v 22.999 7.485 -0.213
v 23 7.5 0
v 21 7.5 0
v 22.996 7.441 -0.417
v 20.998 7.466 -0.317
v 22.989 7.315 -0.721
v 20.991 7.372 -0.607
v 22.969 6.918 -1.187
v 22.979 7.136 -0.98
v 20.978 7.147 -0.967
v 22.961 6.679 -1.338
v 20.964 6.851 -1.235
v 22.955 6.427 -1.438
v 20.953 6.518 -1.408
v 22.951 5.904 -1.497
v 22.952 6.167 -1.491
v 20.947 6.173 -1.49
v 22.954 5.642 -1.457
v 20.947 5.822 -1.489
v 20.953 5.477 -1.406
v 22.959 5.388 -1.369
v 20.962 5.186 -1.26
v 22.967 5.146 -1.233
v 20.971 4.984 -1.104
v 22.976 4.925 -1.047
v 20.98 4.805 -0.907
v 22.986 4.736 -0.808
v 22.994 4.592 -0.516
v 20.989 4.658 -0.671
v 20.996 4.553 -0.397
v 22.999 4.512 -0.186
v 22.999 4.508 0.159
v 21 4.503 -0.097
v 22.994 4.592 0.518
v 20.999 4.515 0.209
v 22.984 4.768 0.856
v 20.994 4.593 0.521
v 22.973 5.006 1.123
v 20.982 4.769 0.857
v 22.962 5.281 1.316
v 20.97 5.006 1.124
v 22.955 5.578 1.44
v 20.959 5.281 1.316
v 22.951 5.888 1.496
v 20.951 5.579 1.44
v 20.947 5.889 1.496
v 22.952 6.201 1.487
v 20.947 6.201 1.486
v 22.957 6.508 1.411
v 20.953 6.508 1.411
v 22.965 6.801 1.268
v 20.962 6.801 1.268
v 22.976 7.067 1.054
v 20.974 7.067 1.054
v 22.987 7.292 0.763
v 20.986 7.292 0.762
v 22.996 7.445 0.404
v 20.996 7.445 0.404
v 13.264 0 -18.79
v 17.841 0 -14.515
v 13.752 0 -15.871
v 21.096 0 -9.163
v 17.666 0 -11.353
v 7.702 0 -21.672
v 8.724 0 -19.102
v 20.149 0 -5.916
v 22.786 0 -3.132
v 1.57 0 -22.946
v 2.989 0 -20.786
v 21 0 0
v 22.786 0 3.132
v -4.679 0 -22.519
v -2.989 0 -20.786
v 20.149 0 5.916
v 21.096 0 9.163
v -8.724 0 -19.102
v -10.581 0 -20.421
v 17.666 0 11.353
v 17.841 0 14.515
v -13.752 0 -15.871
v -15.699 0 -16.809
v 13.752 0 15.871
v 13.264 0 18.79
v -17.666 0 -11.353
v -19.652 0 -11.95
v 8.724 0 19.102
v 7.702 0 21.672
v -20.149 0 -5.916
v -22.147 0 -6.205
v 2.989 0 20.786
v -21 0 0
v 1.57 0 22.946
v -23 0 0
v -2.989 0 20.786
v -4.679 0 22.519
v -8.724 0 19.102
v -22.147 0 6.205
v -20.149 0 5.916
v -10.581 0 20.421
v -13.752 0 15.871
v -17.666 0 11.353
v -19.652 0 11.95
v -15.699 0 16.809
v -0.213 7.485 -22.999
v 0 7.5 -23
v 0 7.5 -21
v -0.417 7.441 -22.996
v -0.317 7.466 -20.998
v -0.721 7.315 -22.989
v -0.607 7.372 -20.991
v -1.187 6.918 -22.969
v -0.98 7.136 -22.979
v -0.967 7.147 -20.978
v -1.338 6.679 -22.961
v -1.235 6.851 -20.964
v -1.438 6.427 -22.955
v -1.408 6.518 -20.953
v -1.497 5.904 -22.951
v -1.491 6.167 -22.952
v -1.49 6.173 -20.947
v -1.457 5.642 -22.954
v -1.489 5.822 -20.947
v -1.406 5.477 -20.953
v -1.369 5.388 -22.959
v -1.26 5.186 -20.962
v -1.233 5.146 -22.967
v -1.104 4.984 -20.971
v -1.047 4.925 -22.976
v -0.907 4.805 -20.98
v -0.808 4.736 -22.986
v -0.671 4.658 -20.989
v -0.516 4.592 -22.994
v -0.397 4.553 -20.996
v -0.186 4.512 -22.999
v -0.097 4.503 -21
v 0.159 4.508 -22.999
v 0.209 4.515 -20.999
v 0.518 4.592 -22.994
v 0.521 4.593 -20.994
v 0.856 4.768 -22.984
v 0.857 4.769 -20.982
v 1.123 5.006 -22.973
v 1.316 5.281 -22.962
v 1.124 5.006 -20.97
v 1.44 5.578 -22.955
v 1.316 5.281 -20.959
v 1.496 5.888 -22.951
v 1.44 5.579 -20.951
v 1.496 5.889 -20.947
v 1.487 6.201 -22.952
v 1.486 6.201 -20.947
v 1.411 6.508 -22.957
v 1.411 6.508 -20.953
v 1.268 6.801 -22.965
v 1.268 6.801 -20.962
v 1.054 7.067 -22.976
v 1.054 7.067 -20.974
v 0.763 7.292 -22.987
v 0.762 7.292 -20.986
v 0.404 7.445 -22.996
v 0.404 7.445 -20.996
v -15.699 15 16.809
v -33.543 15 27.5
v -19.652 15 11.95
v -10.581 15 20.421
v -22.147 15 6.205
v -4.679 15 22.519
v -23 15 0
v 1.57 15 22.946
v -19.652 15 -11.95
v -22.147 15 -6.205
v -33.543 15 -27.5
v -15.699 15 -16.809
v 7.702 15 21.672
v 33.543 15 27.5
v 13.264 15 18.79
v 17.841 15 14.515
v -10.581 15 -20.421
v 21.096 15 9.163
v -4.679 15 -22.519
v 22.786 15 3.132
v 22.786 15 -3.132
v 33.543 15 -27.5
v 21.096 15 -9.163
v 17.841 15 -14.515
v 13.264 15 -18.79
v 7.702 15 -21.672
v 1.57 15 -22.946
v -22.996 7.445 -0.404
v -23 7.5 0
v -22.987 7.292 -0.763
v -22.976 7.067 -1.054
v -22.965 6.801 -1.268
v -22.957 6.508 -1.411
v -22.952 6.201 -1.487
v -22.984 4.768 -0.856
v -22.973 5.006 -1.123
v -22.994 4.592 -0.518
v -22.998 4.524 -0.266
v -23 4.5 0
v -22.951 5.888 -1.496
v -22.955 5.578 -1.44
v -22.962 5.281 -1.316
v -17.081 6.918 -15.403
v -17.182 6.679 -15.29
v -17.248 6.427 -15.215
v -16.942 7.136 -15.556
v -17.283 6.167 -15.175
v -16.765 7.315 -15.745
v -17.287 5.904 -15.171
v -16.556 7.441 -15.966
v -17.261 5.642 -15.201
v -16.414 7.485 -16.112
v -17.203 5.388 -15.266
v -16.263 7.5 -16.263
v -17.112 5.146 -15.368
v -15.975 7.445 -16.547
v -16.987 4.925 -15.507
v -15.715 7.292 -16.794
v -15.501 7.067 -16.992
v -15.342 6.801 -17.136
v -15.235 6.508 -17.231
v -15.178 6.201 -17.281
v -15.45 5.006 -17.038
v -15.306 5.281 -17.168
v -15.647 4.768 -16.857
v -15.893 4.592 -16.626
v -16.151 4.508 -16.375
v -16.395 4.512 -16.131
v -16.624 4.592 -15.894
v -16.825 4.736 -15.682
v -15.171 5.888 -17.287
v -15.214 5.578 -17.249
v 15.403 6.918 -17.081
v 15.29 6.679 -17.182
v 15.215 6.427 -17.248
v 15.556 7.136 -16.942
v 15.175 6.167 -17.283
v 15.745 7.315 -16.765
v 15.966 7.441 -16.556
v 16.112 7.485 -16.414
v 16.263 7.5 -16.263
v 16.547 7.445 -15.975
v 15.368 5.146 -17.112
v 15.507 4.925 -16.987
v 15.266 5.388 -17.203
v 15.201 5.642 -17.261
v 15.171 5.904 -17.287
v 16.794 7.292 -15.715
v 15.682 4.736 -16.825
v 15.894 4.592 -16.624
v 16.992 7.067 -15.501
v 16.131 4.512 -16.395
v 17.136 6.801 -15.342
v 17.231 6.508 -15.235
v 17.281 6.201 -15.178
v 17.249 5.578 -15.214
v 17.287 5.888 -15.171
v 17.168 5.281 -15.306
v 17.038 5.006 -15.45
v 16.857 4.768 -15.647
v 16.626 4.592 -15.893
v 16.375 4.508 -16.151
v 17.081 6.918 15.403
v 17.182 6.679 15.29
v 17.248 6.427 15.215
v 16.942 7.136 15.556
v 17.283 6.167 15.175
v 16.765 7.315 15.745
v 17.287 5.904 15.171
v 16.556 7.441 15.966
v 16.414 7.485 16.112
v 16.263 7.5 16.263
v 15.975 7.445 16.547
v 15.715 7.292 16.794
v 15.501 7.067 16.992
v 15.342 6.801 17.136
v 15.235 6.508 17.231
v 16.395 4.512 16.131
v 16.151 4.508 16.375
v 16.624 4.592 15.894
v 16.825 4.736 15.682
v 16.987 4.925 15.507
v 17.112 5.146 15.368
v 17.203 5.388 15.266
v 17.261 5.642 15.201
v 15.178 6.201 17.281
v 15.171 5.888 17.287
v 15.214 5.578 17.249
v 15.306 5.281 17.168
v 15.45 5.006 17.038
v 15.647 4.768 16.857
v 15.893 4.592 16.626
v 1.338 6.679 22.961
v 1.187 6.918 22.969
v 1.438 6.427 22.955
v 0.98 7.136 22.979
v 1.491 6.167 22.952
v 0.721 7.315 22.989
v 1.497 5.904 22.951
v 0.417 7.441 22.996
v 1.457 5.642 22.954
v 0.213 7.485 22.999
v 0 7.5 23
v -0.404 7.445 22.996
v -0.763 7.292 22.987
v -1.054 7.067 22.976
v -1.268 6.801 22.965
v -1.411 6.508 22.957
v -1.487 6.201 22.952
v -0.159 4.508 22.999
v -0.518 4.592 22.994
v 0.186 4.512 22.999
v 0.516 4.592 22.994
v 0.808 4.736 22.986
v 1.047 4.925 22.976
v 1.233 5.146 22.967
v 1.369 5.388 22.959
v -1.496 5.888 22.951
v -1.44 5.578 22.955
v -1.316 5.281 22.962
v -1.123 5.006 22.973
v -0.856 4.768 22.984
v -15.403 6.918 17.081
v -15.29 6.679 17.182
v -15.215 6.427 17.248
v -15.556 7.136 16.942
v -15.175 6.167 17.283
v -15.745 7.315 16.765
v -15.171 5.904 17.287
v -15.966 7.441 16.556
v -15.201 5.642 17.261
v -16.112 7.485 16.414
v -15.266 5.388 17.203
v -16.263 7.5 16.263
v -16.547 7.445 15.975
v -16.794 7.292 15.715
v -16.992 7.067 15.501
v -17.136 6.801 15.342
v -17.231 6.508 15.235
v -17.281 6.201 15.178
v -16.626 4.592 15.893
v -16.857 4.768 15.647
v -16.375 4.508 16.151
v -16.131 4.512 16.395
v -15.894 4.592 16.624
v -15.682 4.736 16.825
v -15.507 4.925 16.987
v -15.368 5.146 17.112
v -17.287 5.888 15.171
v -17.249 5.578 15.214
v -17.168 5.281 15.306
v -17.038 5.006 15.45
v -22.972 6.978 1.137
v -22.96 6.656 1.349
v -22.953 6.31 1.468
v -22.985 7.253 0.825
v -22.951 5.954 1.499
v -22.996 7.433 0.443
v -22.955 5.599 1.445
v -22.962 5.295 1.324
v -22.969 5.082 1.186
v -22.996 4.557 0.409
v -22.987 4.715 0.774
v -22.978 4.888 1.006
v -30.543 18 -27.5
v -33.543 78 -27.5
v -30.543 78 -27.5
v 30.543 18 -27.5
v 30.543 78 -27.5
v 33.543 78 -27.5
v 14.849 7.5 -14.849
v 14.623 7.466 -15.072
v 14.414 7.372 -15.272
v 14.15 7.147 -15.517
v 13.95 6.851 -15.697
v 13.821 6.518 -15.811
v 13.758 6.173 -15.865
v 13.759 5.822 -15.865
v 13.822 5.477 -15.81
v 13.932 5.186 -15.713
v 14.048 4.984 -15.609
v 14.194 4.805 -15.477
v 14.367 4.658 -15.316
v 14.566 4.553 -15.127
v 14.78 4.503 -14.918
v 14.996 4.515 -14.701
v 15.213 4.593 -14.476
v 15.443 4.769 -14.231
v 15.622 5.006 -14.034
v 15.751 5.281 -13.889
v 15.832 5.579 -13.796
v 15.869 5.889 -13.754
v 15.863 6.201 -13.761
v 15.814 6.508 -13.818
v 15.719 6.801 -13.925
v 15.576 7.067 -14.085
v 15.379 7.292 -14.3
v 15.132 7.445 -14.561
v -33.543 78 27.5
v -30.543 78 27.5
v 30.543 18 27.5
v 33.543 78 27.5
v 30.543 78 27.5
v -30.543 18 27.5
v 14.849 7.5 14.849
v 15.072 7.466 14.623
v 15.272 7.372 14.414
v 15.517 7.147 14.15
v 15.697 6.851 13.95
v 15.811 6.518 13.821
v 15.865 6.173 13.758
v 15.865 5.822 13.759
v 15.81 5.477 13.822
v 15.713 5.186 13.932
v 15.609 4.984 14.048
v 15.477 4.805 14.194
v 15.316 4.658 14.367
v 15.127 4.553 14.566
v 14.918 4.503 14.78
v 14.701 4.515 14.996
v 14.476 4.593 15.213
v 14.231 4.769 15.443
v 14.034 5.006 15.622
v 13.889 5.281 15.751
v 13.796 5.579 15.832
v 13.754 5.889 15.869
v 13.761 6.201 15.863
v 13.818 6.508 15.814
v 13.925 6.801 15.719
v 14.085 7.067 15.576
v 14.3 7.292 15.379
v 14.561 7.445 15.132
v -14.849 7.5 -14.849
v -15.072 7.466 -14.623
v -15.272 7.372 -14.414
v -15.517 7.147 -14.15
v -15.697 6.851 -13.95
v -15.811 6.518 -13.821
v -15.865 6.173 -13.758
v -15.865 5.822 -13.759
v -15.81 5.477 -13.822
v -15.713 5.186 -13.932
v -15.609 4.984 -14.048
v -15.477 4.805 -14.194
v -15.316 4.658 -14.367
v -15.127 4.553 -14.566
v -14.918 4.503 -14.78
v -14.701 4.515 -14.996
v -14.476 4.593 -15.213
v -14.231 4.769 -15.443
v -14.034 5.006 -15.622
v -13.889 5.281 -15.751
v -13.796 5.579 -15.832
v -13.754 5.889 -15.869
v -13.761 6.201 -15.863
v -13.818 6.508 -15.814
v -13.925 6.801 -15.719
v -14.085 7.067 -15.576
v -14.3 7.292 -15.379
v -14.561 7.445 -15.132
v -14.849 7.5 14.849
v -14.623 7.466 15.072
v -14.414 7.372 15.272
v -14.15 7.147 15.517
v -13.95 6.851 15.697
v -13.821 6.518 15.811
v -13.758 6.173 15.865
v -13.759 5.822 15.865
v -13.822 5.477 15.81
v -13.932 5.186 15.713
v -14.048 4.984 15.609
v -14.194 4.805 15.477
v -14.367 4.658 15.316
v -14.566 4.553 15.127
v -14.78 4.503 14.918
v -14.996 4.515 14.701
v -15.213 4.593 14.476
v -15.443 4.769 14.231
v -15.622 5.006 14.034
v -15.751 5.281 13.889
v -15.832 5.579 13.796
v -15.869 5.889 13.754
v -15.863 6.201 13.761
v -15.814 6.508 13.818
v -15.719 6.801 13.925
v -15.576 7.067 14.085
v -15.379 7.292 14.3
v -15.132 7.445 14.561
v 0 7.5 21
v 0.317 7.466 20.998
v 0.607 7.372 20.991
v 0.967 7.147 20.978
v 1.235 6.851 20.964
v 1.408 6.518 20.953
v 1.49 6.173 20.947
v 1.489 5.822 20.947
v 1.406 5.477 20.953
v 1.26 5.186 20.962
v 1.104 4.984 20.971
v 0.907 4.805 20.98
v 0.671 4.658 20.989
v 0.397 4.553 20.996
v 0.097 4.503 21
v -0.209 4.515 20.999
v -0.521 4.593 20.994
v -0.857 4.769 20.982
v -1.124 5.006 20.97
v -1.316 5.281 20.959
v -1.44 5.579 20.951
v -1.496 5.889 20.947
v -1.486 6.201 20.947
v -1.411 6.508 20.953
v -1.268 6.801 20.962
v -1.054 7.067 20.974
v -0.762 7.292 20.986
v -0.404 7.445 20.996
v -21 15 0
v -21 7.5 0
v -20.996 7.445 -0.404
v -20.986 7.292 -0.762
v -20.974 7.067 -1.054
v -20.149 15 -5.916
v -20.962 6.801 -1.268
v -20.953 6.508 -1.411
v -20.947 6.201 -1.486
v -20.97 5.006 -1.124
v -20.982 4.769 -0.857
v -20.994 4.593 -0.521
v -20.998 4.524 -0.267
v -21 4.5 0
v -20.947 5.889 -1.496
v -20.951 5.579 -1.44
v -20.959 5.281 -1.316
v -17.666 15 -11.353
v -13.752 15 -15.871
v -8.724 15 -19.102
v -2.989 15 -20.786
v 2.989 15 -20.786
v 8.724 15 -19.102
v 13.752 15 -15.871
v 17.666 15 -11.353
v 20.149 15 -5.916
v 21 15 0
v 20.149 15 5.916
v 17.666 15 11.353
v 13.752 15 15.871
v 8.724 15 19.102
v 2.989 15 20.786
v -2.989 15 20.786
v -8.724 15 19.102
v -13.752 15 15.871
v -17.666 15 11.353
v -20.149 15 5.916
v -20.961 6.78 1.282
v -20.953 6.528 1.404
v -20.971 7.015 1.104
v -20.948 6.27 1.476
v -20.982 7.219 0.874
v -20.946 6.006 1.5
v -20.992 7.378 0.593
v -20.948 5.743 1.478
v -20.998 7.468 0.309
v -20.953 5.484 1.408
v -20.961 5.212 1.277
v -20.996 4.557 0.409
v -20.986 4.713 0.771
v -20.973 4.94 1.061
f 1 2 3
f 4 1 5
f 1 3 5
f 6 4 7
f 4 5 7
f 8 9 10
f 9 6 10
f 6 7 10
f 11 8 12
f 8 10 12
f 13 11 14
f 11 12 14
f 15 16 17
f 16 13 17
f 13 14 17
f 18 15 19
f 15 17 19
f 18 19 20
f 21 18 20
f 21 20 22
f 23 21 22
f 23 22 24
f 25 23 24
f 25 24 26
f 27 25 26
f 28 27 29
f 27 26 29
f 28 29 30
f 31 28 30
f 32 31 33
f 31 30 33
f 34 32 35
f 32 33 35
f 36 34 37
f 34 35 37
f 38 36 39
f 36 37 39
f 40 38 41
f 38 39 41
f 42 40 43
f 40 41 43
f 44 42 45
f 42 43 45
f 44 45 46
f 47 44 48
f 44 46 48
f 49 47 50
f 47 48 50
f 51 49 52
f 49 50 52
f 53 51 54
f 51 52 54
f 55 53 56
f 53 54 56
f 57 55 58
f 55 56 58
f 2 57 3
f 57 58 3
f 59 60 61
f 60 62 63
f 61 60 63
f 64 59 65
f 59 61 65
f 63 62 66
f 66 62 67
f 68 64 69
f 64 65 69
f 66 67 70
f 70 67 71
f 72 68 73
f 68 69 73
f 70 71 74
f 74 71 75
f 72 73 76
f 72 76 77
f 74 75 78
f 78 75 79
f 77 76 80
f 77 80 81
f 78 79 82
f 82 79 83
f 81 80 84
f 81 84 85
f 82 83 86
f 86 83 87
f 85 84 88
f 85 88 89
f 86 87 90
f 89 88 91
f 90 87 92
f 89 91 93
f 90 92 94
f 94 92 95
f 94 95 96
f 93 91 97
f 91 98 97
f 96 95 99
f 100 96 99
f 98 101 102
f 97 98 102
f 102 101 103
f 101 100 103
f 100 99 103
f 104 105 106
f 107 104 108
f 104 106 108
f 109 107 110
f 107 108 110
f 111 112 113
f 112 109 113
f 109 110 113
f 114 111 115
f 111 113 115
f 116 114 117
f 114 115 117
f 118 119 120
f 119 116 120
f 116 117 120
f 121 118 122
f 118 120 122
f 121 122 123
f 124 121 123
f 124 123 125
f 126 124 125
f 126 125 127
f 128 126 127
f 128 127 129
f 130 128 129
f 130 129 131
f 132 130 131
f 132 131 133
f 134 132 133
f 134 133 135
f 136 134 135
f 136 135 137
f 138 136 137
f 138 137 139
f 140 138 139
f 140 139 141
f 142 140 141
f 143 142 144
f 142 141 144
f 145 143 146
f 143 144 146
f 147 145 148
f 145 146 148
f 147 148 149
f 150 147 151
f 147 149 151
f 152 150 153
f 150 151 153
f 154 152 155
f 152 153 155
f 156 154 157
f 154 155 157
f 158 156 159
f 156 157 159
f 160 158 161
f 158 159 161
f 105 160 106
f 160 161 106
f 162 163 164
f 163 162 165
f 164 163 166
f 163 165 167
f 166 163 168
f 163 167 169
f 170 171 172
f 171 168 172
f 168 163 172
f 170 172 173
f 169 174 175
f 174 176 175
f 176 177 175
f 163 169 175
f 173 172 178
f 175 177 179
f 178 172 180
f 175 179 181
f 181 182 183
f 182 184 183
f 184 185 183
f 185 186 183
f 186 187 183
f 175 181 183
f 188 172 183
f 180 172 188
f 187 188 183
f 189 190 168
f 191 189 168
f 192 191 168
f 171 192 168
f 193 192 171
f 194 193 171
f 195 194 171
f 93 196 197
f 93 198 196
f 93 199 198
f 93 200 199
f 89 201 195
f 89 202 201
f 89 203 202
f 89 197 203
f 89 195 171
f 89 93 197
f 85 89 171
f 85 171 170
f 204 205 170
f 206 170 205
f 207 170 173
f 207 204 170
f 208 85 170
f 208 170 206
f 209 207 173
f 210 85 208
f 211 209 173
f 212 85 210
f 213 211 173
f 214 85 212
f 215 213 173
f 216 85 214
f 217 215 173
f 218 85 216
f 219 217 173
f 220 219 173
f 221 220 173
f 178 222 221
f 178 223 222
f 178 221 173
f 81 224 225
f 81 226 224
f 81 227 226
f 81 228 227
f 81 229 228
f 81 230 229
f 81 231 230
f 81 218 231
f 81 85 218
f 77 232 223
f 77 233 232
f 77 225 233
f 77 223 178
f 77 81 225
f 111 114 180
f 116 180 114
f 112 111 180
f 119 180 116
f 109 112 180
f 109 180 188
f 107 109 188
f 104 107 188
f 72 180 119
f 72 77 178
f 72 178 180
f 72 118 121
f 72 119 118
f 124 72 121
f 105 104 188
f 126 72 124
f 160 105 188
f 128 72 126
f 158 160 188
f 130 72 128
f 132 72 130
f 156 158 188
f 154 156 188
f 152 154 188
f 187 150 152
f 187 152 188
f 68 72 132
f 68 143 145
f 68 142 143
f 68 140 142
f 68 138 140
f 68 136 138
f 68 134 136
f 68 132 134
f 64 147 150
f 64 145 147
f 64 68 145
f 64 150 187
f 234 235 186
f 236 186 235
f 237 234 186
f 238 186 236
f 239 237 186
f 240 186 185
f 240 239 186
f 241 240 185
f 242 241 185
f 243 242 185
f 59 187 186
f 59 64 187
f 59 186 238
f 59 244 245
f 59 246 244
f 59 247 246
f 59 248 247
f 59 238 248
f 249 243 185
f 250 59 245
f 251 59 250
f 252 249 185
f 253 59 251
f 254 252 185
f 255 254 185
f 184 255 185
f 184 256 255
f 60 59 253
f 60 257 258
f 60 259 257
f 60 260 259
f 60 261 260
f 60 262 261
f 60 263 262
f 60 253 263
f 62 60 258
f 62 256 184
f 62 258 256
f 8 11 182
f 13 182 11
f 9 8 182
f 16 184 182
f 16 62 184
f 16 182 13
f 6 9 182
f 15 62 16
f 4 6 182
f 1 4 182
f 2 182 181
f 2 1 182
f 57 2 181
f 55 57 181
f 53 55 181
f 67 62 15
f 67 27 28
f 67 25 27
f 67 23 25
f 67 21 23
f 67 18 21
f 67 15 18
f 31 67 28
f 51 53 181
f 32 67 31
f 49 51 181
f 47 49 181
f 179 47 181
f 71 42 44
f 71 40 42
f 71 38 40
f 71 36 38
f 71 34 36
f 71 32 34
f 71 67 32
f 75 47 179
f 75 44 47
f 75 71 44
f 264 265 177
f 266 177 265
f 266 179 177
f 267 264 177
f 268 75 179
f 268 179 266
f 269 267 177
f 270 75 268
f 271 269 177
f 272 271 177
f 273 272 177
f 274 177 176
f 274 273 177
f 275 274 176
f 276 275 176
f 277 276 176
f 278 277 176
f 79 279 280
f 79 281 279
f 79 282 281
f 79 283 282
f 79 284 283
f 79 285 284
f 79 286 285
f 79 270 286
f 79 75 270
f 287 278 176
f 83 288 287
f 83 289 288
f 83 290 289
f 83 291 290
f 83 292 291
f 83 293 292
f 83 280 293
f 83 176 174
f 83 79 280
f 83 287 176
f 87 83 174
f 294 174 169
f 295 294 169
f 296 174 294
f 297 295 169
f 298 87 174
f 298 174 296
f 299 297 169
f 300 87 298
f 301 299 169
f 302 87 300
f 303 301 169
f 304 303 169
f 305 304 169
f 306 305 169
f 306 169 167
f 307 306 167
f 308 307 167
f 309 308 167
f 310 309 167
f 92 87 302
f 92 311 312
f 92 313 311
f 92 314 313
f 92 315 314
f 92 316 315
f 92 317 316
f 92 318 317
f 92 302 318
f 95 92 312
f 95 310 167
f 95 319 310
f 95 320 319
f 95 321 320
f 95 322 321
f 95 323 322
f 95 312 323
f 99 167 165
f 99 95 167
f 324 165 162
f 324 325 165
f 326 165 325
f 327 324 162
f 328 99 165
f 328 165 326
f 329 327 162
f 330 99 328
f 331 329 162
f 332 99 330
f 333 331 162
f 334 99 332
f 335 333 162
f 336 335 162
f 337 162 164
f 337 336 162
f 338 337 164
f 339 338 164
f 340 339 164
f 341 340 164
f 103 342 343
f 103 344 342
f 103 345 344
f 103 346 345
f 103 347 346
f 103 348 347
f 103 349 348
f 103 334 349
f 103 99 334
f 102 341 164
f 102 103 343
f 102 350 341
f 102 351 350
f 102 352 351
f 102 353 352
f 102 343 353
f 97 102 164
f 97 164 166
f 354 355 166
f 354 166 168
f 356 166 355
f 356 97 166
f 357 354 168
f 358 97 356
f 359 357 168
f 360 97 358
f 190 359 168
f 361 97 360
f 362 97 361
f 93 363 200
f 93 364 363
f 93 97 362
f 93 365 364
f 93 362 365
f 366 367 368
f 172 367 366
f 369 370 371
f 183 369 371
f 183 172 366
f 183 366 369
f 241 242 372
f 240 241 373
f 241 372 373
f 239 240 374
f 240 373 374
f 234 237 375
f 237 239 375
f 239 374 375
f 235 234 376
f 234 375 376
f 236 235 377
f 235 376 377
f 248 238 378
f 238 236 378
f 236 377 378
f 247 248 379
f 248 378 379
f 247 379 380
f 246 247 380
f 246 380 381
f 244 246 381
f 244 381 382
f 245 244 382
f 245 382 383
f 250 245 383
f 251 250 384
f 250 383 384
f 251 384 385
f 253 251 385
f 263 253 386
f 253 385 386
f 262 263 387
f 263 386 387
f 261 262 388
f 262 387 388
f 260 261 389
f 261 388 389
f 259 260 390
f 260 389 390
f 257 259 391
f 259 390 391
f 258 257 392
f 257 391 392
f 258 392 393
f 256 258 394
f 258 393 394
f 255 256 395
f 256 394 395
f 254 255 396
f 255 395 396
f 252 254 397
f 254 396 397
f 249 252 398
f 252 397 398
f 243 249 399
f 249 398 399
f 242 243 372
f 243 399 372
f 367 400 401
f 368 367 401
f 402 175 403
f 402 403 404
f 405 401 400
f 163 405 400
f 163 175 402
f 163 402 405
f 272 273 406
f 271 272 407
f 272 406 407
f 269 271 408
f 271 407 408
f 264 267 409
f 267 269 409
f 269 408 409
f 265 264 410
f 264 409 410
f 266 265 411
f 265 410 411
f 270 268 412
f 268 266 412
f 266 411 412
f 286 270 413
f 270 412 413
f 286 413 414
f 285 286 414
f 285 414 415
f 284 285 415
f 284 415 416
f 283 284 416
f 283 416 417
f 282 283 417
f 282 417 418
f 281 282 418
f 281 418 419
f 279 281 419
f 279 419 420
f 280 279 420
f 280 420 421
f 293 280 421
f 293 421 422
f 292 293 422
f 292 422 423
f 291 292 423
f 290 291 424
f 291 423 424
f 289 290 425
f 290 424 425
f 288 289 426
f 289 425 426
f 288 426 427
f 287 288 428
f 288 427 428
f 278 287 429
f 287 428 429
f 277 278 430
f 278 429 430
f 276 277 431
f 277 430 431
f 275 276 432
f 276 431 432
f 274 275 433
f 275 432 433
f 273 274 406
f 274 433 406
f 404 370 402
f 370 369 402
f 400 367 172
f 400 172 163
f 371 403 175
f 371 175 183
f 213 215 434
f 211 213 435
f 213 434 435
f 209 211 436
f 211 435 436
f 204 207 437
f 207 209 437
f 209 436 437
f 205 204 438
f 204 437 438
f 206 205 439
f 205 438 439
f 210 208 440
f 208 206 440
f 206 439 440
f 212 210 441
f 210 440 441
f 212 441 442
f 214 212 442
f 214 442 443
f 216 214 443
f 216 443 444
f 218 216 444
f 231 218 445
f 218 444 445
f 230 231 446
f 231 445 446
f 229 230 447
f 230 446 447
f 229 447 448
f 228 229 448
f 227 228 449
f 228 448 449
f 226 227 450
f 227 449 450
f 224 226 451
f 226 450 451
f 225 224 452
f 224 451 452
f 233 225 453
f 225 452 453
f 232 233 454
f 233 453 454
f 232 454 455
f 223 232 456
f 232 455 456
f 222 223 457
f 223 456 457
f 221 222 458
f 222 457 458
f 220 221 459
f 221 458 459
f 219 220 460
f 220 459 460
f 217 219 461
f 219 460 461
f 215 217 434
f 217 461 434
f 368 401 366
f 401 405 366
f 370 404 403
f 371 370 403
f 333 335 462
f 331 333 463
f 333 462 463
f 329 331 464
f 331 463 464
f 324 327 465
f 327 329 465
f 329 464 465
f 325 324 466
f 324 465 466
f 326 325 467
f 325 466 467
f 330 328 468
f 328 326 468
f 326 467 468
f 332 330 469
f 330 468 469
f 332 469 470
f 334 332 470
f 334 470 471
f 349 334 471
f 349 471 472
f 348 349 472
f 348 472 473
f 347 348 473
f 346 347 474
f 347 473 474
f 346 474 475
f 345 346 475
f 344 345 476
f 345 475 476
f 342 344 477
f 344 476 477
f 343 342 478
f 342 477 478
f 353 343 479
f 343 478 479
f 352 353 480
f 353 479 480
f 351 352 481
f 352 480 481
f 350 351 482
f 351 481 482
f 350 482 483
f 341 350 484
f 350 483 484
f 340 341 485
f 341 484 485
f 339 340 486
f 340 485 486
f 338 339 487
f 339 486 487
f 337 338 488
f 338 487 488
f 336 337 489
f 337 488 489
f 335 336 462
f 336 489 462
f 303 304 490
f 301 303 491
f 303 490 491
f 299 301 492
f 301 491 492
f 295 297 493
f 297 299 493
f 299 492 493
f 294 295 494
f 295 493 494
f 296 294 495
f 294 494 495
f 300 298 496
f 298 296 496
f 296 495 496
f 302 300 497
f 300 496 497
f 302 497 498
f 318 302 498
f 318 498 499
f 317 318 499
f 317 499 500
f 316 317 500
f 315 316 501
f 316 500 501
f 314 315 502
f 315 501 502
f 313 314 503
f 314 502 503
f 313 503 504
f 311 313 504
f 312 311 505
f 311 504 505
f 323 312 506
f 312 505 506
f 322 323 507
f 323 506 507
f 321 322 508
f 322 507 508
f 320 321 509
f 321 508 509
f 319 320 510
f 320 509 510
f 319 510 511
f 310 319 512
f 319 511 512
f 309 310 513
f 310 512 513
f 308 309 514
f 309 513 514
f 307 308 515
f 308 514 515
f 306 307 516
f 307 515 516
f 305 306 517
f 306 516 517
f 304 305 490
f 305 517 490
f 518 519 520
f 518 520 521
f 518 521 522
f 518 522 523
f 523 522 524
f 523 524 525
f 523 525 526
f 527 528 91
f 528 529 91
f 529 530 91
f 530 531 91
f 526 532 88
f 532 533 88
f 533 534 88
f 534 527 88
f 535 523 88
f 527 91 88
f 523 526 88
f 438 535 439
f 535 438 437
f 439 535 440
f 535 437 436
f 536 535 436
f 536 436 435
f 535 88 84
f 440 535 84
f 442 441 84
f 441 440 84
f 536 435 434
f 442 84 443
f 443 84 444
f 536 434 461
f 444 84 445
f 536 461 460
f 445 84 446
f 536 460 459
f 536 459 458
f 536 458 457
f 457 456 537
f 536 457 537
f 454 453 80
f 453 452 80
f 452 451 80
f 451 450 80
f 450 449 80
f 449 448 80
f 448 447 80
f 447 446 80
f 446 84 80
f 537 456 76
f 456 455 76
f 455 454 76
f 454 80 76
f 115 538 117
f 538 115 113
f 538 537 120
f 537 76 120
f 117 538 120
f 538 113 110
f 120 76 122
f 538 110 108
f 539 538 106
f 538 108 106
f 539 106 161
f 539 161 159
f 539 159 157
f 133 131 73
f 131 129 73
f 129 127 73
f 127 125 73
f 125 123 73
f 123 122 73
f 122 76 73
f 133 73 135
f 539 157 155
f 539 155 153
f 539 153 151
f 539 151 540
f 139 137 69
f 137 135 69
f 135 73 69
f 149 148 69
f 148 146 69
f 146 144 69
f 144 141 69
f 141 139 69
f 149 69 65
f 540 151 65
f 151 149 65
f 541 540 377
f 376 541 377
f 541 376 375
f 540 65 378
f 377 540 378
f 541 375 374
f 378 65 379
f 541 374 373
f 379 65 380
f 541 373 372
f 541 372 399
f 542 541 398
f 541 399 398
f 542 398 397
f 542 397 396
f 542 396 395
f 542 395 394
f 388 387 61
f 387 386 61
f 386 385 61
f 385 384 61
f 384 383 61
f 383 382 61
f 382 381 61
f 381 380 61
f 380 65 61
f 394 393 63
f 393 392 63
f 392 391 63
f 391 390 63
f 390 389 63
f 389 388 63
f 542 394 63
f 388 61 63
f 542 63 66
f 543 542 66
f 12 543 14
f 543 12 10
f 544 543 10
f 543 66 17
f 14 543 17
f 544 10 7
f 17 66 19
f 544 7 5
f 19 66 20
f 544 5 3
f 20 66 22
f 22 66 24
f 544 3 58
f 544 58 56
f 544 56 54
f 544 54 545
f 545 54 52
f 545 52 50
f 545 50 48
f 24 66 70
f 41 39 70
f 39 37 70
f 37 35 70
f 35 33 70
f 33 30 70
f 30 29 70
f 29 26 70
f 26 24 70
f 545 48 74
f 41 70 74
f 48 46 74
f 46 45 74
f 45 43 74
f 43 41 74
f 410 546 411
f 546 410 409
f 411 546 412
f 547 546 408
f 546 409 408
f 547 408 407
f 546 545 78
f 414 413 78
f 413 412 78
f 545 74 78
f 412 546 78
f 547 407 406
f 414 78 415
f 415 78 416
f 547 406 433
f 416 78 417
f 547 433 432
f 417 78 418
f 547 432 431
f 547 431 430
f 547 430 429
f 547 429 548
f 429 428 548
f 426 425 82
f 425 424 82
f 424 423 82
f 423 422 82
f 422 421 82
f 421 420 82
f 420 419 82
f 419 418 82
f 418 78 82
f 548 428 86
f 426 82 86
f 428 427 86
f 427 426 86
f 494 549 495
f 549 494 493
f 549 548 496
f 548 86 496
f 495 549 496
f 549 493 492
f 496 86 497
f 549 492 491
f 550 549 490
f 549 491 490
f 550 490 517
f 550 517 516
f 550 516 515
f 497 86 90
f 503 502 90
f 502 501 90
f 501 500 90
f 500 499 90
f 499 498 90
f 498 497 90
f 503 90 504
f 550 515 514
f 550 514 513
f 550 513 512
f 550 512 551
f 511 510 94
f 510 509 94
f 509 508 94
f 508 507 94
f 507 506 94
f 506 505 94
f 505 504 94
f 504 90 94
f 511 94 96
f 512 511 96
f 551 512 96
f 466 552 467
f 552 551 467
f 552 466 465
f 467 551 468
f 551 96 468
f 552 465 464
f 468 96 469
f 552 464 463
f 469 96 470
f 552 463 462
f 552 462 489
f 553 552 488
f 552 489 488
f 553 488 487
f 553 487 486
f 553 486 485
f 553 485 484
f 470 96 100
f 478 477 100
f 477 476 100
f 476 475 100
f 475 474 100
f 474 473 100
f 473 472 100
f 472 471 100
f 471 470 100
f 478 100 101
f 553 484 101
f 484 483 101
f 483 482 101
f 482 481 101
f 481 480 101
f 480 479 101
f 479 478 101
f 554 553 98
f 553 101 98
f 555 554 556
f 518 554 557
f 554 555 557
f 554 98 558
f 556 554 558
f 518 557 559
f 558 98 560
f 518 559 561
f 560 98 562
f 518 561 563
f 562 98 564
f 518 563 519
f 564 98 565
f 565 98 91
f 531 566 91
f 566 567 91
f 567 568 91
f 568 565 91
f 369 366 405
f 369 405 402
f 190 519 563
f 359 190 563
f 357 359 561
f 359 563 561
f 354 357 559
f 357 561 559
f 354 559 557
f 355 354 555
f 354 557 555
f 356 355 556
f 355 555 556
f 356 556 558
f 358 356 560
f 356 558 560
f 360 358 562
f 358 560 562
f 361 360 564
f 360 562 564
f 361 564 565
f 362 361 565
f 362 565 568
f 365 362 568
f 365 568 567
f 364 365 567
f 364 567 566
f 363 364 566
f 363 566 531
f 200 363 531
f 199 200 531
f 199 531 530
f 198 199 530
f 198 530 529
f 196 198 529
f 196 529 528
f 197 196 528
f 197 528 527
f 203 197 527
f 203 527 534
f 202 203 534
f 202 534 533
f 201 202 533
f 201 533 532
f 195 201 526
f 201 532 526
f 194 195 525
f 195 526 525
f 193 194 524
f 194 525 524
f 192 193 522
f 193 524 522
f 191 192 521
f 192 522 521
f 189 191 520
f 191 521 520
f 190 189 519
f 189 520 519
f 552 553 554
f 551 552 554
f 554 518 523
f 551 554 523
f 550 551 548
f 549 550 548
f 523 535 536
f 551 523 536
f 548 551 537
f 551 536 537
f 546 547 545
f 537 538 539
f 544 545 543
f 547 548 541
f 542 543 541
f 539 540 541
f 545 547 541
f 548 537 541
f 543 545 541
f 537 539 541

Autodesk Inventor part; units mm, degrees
ref_plane "YZ Plane" through (0, 0, 0) normal (1, 0, 0) x (0, 1, 0)
ref_plane "XZ Plane" through (0, 0, 0) normal (0, 1, 0) x (-1, 0, 0)
ref_plane "XY Plane" through (0, 0, 0) normal (0, 0, 1) x (1, 0, 0)
sketch "Sketch1" plane through (0, 0, 0) normal (0, 1, 0) x (-1, 0, 0)
  circle A0 centre (0, 0) radius 21
  circle A1 centre (0, 0) radius 23
  dimension "d0" = 42
  dimension "d1" = 2
extrude "Extrusion1" add sketch "Sketch1" along normal blind 15
sketch "Sketch2" plane through (0, 15, 0) normal (0, 1, 0) x (1, 0, 0)
  line L0 (26, -27.5) -> (-26, -27.5)
  line L1 (-26, 27.5) -> (26, 27.5)
  line L2 (26, -27.5) -> (-26, 27.5) construction
  line L3 (-26, -27.5) -> (26, 27.5) construction
  line L4 (-26, 27.5) -> (-29, 27.5)
  line L5 (-29, -27.5) -> (-26, -27.5)
  line L6 (26, 27.5) -> (29, 27.5)
  line L7 (29, -27.5) -> (26, -27.5)
  circle A0 centre (0, 0) radius 11.075
  line L8 (-30.543, 0) -> (-30.543, -27.5)
  line L9 (-30.543, -27.5) -> (-29, -27.5)
  line L10 (-30.543, 0) -> (-30.543, 27.5)
  line L11 (-30.543, 27.5) -> (-29.0865, 27.5)
  line L12 (30.543, 0) -> (30.543, 27.5)
  line L13 (30.543, 27.5) -> (29, 27.5)
  line L14 (30.543, 0) -> (30.543, -27.5)
  line L15 (30.543, -27.5) -> (29, -27.5)
  line L16 (30.543, -27.5) -> (33.543, -27.5)
  line L17 (33.543, -27.5) -> (33.543, 27.5)
  line L18 (33.543, 27.5) -> (30.543, 27.5)
  line L19 (-30.543, 27.5) -> (-33.543, 27.5)
  line L20 (-33.543, 27.5) -> (-33.543, -27.5)
  line L21 (-33.543, -27.5) -> (-30.543, -27.5)
  line L22 (-29.0865, 27.5) -> (-29, 27.5)
  line L23 (30.543, 27.5) -> (33.543, 27.5)
  line L24 (33.543, 27.5) -> (33.543, -27.5)
  line L25 (33.543, -27.5) -> (30.543, -27.5)
  line L26 (30.543, -27.5) -> (30.543, 27.5)
  line L27 (-33.543, 27.5) -> (-30.543, 27.5)
  line L28 (-30.543, 27.5) -> (-30.543, -27.5)
  line L29 (-30.543, -27.5) -> (-33.543, -27.5)
  line L30 (-33.543, -27.5) -> (-33.543, 27.5)
  dimension "d4" = 52
  dimension "d6" = 3
  dimension "d7" = 3
  dimension "d21" = 22.15
  dimension "d23" = 30.543
  dimension "d24" = 3
extrude "Extrusion2" add sketch "Sketch2" along normal blind 3 contours L0 L5 L9 L8 L10 L11 L22 L4 L1 L6 L13 L12 L14 L15 L7 | A0
sketch "Sketch3" plane through (0, 0, 0) normal (1, 0, 0) x (0, 1, 0)
  circle A0 centre (6, 0) radius 1.5
  line L0 (0, 21) -> (0, -21) projected
  point P0 (0, 0)
  dimension "d14" = 3
  dimension "d15" = 6
extrude "Extrusion4" cut sketch "Sketch3" along normal up to surface
pattern_circular "Circular Pattern1" count 8 over 360 about axis through (0, 0, 0) along (0, 1, 0) of "Extrusion4"
extrude "Extrusion5" add sketch "Sketch2" along normal blind 63 contours L14 L12 L18 L17 L16 | L21 L20 L19 L10 L8
equation "\"d23\" = d22"
equation "\"d22\" = 30.543"
properties part number "baseatas" material "Aluminum 6061"
